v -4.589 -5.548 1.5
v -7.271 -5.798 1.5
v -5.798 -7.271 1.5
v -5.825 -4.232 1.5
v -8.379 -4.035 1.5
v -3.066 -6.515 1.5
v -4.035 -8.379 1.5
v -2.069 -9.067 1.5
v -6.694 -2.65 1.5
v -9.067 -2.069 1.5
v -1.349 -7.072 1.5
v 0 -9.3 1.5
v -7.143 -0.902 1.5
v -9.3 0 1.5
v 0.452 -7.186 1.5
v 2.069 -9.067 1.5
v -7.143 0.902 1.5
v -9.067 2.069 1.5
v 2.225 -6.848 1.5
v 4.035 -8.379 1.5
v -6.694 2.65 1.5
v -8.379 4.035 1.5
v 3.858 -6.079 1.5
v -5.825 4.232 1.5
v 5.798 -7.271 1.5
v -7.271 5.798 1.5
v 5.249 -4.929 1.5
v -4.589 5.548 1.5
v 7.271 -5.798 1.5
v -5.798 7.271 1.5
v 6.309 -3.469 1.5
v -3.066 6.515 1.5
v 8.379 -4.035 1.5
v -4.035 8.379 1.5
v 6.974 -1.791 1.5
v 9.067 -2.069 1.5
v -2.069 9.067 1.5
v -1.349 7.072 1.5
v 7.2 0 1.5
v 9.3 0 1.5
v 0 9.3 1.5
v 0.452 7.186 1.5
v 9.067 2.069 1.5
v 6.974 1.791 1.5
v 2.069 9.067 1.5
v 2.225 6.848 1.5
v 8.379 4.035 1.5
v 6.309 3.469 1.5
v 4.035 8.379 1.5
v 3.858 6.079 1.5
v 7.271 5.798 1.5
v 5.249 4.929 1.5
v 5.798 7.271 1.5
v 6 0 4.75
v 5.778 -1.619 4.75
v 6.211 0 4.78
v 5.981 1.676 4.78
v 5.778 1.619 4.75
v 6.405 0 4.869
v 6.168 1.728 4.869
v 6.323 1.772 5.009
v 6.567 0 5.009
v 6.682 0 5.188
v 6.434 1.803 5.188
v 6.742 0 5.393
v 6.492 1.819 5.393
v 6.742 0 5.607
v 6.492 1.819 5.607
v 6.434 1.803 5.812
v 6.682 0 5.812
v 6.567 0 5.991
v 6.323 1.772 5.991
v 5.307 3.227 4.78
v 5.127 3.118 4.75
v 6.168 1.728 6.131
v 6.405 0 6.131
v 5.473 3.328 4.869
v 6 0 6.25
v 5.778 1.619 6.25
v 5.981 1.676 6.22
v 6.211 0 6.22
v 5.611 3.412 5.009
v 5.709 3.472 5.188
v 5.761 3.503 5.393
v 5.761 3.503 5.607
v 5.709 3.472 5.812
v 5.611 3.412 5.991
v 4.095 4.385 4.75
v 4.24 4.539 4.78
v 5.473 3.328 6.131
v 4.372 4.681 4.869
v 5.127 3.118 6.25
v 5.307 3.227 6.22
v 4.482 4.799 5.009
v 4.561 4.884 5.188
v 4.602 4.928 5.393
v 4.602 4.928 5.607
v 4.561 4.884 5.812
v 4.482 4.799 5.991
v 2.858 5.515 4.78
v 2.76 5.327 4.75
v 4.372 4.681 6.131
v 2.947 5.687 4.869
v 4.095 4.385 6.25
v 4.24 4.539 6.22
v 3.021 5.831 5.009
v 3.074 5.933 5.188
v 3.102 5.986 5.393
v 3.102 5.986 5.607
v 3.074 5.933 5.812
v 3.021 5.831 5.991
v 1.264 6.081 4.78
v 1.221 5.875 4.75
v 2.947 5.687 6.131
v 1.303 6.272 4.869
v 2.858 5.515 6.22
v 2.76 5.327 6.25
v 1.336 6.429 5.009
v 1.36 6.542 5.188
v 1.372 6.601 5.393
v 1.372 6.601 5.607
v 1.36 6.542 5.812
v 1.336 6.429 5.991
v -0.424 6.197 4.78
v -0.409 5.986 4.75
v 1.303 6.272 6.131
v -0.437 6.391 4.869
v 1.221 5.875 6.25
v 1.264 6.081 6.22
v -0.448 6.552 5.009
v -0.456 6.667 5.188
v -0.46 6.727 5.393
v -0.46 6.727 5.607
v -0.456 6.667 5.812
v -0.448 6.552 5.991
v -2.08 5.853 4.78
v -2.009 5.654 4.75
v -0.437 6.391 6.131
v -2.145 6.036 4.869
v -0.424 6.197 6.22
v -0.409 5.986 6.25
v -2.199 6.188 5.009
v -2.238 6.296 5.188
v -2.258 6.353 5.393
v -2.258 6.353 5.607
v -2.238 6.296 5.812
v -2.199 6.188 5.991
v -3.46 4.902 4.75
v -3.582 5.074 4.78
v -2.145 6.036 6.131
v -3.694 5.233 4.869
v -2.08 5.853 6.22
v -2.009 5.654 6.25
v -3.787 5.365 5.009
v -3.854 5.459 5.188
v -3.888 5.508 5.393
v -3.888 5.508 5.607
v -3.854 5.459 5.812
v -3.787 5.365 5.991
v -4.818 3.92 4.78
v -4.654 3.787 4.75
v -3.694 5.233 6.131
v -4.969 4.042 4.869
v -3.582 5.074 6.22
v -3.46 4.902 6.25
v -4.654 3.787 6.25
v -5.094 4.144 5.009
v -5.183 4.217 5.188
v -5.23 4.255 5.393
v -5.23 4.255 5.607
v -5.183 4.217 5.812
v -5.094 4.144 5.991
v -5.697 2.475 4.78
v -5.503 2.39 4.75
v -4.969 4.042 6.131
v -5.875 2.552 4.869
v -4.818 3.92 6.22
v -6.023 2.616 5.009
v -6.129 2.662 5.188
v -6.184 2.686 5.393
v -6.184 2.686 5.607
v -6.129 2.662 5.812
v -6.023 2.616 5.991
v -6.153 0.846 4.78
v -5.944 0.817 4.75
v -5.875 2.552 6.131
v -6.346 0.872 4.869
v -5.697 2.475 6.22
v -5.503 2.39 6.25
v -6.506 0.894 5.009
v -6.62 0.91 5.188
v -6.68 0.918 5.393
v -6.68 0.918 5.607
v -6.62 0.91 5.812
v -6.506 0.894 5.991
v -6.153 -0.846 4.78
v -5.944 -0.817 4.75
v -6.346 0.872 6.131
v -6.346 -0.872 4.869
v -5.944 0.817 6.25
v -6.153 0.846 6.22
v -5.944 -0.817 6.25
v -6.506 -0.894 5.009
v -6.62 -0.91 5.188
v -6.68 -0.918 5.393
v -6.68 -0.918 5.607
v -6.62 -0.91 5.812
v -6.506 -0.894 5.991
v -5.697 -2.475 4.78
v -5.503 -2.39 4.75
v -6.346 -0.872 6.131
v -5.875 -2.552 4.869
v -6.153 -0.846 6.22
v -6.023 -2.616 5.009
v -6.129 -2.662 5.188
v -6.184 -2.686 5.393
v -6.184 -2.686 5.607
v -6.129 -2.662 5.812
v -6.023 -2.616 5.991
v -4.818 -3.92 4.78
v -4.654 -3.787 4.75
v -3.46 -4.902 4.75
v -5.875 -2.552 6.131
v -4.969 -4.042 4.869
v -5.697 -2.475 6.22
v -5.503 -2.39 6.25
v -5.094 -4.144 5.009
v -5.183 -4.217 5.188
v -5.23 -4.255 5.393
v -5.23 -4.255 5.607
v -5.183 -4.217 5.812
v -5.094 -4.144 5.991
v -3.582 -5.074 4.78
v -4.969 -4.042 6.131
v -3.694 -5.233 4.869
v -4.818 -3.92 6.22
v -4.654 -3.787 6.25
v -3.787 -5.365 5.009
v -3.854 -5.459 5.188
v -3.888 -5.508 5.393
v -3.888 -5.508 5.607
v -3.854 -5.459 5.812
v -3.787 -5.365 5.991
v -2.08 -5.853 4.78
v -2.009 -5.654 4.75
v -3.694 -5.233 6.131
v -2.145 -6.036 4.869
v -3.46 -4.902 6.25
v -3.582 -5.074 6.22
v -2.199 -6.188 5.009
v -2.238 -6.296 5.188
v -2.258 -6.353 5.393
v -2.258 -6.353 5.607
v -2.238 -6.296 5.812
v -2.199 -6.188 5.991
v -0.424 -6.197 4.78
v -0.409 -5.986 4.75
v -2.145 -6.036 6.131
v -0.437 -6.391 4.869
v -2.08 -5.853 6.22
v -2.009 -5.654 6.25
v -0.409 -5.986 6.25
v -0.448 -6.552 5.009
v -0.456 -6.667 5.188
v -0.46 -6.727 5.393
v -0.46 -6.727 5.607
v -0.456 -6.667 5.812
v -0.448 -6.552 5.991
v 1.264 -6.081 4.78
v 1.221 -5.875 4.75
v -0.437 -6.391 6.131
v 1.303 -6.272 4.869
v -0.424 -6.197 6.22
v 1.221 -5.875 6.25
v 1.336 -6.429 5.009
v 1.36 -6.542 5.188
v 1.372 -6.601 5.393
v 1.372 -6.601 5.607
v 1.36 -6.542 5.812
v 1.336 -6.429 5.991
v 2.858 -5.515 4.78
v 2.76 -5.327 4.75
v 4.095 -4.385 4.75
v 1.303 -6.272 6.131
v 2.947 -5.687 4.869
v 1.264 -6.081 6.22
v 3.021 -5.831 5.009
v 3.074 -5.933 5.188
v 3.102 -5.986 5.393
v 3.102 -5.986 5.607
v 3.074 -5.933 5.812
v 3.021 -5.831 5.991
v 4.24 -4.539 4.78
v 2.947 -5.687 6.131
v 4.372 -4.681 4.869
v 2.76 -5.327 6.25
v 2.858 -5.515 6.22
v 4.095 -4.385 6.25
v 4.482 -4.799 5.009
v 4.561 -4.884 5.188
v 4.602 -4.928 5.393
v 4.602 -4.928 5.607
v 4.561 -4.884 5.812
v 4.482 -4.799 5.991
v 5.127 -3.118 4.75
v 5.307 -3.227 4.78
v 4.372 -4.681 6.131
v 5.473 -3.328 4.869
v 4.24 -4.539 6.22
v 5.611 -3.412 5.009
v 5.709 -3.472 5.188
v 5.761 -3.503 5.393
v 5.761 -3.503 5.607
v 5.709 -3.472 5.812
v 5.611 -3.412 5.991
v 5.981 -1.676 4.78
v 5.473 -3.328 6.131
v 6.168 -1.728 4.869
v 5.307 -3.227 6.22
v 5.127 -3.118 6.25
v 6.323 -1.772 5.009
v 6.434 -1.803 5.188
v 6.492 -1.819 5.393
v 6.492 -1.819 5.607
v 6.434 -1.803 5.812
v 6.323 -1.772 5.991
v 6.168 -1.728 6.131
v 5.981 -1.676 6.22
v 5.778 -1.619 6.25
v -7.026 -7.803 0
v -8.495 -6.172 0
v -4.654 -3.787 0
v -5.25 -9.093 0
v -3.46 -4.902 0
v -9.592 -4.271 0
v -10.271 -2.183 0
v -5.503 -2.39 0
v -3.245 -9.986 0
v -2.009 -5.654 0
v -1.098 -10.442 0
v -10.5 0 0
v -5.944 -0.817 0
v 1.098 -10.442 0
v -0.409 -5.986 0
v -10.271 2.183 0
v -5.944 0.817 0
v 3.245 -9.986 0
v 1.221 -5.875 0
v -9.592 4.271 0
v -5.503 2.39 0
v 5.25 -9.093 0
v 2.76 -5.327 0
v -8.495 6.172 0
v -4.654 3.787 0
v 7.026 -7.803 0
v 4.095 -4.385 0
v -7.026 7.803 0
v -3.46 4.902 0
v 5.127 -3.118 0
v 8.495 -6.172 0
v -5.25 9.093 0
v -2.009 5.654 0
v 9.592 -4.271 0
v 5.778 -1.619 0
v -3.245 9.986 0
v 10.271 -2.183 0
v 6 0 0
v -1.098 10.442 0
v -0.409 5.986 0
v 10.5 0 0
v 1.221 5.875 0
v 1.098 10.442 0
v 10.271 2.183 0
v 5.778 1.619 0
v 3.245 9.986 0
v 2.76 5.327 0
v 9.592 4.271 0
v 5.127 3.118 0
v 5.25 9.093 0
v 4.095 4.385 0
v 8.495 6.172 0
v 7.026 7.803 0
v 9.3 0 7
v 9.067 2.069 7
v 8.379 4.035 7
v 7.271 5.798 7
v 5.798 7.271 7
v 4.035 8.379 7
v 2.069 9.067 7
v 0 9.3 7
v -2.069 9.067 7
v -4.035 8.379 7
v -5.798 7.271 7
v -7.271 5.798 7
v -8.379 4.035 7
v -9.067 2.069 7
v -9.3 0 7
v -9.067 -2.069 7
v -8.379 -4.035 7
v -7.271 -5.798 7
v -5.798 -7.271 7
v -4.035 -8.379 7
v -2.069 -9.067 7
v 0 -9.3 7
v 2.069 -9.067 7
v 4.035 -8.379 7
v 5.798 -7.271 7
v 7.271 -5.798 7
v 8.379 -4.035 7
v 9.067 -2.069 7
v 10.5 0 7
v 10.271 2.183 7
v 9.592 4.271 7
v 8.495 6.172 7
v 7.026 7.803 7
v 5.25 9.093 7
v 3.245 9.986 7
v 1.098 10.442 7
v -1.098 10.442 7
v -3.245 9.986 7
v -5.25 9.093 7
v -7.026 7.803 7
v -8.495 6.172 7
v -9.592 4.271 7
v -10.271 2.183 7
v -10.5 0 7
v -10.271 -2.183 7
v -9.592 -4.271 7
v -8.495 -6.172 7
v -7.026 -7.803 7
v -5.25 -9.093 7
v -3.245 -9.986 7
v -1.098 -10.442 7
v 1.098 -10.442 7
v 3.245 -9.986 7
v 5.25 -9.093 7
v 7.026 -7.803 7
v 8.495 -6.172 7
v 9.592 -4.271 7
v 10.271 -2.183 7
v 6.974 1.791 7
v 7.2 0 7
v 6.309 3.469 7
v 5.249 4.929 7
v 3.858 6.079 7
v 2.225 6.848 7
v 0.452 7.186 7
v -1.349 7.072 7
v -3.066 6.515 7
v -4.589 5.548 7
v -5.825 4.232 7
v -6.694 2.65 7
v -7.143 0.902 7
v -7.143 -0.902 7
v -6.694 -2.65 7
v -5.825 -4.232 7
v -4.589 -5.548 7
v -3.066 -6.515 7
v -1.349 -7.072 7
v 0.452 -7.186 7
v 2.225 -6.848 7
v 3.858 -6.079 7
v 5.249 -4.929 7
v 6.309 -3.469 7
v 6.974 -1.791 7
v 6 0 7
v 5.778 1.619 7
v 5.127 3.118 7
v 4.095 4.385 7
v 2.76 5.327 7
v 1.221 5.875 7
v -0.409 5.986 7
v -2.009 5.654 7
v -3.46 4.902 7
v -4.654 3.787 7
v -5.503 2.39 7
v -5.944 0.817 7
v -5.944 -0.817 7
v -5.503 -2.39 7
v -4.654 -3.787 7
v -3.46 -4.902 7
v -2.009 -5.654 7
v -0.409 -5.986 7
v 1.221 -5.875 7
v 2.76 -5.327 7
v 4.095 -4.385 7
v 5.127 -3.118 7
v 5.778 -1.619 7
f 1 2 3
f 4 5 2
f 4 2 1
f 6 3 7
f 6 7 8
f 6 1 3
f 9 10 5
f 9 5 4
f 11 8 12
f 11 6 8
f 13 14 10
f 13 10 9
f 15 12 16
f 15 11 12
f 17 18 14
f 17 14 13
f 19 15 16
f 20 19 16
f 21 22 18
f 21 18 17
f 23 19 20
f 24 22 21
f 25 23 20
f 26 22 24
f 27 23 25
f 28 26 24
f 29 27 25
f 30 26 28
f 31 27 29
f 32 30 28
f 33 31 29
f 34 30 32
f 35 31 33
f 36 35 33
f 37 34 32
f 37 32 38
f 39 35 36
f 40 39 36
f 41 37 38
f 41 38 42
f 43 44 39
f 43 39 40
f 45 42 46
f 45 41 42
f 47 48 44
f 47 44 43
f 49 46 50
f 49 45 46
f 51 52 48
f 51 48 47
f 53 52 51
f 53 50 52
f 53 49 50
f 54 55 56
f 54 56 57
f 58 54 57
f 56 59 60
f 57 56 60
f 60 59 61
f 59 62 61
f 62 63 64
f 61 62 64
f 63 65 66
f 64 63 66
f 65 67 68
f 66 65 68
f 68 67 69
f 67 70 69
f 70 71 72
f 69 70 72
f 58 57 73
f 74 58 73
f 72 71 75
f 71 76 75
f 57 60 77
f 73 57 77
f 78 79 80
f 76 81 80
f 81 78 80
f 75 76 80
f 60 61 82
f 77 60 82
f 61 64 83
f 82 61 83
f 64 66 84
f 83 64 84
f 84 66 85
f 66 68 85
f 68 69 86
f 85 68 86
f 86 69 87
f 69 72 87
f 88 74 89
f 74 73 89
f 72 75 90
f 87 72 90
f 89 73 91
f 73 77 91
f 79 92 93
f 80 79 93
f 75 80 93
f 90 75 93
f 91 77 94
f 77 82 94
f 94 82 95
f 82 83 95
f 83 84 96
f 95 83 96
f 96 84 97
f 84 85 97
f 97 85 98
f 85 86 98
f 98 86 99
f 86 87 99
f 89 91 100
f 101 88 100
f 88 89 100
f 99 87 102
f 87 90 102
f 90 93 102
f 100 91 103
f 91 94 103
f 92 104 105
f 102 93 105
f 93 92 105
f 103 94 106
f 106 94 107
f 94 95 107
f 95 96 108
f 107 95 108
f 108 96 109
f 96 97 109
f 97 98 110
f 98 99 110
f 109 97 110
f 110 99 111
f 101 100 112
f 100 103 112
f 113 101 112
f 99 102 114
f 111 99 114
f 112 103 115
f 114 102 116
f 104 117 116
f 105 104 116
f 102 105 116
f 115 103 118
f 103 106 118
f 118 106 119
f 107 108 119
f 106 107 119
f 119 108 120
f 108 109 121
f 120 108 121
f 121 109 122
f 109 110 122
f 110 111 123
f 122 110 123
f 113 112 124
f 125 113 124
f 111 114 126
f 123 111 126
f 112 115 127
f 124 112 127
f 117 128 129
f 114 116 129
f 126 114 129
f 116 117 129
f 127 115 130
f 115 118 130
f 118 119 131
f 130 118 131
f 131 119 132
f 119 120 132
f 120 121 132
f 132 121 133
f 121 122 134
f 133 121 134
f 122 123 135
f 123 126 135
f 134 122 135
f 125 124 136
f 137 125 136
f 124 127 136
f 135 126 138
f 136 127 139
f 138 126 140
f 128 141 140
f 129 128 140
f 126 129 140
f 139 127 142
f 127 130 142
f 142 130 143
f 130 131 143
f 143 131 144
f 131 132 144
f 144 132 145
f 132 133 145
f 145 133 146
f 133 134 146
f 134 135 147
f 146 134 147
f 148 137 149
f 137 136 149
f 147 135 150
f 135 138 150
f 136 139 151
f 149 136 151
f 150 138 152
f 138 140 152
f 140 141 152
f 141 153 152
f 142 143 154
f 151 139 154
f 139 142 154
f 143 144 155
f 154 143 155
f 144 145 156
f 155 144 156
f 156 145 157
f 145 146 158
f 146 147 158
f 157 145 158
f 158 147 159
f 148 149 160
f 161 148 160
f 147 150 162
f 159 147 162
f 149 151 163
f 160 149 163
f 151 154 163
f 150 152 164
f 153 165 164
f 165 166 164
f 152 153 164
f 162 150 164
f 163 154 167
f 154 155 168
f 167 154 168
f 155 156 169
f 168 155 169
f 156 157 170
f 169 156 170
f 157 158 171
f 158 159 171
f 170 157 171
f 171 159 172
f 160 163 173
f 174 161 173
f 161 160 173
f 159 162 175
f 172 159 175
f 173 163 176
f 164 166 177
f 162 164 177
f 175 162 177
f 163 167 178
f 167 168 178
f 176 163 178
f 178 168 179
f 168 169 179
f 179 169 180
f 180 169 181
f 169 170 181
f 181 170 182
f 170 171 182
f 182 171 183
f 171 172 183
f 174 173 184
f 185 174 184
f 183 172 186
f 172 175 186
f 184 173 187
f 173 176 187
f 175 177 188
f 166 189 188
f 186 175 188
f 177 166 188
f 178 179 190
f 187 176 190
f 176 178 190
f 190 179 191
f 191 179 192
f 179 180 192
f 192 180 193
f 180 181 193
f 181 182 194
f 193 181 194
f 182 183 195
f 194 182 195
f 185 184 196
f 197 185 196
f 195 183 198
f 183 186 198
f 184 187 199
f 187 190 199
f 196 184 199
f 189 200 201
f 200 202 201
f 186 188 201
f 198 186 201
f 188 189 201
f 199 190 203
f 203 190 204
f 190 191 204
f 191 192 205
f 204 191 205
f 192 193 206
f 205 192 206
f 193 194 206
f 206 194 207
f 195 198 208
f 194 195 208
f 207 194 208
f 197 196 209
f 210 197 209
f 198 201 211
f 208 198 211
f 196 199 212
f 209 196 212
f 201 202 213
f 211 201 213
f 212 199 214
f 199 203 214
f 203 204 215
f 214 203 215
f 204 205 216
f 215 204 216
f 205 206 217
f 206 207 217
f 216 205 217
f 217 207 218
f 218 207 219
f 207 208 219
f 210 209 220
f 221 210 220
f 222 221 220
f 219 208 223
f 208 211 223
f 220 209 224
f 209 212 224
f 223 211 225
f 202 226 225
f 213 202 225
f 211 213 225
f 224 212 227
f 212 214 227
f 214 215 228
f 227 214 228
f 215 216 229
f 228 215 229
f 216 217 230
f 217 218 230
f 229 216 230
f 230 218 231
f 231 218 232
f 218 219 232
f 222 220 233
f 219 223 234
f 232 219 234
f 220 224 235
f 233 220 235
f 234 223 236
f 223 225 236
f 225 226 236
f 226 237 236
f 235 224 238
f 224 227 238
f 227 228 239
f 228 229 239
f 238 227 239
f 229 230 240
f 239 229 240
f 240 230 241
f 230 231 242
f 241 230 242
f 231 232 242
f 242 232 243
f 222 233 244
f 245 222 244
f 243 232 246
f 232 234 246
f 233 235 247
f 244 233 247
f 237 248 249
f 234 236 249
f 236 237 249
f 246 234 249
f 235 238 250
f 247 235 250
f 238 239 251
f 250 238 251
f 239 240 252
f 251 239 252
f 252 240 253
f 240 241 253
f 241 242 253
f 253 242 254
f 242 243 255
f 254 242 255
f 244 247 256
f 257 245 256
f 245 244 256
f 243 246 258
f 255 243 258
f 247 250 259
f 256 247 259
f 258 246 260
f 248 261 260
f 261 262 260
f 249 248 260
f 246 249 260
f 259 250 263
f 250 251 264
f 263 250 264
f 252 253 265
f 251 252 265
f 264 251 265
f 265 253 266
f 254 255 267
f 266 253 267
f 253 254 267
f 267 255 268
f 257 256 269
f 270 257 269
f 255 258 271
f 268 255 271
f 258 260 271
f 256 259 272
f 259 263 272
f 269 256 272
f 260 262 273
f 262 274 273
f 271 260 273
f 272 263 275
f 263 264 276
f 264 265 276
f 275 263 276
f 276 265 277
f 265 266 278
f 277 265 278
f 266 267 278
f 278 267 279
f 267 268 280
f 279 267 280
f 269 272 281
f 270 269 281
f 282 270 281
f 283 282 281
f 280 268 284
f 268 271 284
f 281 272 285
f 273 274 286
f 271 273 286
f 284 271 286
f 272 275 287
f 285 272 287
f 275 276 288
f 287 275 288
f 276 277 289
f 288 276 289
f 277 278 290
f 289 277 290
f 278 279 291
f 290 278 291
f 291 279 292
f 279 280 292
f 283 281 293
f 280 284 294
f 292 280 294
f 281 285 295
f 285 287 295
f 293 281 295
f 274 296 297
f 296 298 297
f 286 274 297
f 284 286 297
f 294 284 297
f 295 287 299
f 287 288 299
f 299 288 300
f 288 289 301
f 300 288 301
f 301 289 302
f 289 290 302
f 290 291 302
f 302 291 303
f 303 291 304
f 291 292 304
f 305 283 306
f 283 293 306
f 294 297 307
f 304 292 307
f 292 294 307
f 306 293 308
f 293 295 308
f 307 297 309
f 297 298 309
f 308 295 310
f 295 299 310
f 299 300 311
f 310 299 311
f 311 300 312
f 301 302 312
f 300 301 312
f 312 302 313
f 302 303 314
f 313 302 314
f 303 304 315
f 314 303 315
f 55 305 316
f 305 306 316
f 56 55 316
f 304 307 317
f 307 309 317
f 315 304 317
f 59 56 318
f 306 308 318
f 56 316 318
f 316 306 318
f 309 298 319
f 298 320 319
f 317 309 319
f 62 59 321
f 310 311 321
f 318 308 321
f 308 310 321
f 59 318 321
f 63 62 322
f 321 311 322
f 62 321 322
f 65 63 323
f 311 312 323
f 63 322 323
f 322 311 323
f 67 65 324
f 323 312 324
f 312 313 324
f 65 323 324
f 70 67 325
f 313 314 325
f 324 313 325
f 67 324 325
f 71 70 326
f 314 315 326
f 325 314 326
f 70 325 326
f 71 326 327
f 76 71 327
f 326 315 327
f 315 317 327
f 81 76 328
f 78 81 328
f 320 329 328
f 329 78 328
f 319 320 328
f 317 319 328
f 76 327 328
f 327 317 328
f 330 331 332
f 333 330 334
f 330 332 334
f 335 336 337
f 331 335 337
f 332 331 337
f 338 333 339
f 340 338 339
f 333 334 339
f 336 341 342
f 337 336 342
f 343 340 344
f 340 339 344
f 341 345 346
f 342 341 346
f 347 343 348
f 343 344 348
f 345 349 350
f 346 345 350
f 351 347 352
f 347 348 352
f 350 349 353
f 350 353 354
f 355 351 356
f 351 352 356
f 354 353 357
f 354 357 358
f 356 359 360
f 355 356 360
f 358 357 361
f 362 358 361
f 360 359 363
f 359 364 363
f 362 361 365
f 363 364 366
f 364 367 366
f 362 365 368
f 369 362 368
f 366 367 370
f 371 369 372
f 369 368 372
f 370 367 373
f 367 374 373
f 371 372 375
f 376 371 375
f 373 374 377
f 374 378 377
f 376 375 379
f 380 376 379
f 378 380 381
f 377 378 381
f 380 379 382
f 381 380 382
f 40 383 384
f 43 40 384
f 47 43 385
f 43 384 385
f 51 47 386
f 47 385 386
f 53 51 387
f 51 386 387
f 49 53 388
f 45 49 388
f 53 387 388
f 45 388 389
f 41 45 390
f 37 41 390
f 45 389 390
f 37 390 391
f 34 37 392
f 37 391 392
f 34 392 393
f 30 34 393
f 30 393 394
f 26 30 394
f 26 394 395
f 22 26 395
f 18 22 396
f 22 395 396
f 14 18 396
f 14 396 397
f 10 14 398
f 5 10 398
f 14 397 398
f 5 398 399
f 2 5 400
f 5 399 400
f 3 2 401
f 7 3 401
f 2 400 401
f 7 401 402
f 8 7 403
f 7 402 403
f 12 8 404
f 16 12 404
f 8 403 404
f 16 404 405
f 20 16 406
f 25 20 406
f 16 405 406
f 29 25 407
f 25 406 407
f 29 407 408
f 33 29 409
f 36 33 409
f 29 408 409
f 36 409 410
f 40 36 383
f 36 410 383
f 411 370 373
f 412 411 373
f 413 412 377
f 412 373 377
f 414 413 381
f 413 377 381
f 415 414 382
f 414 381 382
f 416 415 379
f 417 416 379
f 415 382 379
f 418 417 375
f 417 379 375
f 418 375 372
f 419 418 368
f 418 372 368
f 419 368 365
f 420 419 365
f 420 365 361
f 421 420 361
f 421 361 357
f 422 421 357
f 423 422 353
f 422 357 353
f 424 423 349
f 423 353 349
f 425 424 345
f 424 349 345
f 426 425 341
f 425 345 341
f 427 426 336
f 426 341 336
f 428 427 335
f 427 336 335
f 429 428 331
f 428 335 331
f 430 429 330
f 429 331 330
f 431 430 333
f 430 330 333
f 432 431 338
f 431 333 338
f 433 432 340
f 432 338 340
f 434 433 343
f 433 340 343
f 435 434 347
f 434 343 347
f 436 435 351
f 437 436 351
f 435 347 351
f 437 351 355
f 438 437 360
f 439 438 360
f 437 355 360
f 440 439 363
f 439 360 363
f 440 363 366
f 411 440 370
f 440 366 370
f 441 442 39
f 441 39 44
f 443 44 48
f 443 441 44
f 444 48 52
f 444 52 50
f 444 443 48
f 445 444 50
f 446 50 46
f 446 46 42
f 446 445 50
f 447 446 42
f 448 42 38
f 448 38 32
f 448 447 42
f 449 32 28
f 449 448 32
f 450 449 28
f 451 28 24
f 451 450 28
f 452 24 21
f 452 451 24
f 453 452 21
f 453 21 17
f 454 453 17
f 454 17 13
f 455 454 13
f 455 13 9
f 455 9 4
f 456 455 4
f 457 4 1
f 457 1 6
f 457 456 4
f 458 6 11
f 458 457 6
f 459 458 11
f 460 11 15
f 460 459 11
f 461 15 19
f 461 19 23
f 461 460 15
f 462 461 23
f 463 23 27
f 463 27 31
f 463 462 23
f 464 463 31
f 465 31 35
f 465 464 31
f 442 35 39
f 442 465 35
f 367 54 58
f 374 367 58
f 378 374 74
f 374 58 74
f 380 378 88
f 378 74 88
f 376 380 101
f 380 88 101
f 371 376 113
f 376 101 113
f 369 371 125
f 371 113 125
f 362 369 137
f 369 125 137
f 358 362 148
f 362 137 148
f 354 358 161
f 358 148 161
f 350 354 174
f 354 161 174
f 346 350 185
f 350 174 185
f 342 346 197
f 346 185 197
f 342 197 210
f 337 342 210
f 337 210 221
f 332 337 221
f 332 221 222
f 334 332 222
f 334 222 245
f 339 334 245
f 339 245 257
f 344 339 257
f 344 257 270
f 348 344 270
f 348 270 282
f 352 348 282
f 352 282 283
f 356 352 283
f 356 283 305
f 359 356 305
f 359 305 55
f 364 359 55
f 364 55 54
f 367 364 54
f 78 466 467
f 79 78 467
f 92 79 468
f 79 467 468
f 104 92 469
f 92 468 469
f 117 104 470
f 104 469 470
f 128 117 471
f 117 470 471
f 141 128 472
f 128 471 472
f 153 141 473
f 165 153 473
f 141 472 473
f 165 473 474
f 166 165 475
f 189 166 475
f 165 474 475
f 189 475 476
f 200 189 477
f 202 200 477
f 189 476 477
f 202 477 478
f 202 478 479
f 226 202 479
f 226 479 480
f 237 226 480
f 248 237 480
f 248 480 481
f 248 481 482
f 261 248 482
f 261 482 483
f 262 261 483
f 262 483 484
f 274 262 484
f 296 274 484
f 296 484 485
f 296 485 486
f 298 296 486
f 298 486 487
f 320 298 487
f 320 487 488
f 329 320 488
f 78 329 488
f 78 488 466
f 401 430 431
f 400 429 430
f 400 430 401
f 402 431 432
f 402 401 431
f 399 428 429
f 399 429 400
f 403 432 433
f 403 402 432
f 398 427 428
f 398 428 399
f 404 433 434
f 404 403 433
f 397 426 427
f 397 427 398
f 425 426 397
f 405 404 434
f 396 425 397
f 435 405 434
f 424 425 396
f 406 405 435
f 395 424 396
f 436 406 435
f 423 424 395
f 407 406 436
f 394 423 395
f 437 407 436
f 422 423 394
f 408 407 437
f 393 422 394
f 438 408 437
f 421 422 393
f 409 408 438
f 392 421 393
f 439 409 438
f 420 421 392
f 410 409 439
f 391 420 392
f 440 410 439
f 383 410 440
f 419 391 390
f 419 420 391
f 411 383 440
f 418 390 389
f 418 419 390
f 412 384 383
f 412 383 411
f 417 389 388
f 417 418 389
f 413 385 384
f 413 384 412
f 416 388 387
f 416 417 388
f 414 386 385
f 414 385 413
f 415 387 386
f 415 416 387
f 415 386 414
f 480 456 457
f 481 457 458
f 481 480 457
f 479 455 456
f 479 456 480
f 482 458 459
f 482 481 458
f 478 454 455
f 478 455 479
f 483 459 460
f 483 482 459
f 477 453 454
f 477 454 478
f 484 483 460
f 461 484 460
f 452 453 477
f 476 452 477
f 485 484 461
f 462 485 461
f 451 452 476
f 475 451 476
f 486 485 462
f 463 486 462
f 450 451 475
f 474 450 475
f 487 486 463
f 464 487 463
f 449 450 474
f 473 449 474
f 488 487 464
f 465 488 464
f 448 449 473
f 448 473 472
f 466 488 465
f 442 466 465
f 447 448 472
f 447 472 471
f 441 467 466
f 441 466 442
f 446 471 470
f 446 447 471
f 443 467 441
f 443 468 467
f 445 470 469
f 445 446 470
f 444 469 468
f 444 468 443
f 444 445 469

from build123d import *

# Parameters (mm, degrees)
SKETCH_1_R          = 10.5
EXTRUDE_1_DEPTH     = 7
SKETCH_2_R          = 6
CUT_EXTRUDE_1_DEPTH = 17.416455159
SKETCH_3_R          = 9.3
SKETCH_3_R_2        = 7.2
CUT_EXTRUDE_2_DEPTH = 5.5
SWEEP_1_PROFILE_R   = 0.75


with BuildPart() as part:
    # 草图1 → 凸台-拉伸1 (new body)
    with BuildSketch(Plane.XY):
        Circle(SKETCH_1_R)
    extrude(amount=EXTRUDE_1_DEPTH)

    # 草图2 → 切除-拉伸1 (cut, through all)
    with BuildSketch(Plane.XY.offset(7)):
        Circle(SKETCH_2_R)
    extrude(amount=-CUT_EXTRUDE_1_DEPTH, mode=Mode.SUBTRACT)

    # 草图3 → 切除-拉伸2 (cut)
    with BuildSketch(Plane.XY.offset(7)):
        Circle(SKETCH_3_R)
        Circle(SKETCH_3_R_2, mode=Mode.SUBTRACT)
    extrude(amount=-CUT_EXTRUDE_2_DEPTH, mode=Mode.SUBTRACT)

    # 切除-扫描1: sweep along a path in 草图5
    with BuildLine(Plane.XY.offset(5.5)) as sweep_1_path:
        CenterArc((0, 0), 6, 0, 360)
    # 切除-扫描1 profile (on start of the path) → 切除-扫描1 (sweep, cut)
    with BuildSketch(Plane(origin=(6, 0, 5.5), x_dir=(0, 0, 1), z_dir=(0, 1, 0))):
        Circle(SWEEP_1_PROFILE_R)
    sweep(path=sweep_1_path.line, mode=Mode.SUBTRACT)


solid = part.part
